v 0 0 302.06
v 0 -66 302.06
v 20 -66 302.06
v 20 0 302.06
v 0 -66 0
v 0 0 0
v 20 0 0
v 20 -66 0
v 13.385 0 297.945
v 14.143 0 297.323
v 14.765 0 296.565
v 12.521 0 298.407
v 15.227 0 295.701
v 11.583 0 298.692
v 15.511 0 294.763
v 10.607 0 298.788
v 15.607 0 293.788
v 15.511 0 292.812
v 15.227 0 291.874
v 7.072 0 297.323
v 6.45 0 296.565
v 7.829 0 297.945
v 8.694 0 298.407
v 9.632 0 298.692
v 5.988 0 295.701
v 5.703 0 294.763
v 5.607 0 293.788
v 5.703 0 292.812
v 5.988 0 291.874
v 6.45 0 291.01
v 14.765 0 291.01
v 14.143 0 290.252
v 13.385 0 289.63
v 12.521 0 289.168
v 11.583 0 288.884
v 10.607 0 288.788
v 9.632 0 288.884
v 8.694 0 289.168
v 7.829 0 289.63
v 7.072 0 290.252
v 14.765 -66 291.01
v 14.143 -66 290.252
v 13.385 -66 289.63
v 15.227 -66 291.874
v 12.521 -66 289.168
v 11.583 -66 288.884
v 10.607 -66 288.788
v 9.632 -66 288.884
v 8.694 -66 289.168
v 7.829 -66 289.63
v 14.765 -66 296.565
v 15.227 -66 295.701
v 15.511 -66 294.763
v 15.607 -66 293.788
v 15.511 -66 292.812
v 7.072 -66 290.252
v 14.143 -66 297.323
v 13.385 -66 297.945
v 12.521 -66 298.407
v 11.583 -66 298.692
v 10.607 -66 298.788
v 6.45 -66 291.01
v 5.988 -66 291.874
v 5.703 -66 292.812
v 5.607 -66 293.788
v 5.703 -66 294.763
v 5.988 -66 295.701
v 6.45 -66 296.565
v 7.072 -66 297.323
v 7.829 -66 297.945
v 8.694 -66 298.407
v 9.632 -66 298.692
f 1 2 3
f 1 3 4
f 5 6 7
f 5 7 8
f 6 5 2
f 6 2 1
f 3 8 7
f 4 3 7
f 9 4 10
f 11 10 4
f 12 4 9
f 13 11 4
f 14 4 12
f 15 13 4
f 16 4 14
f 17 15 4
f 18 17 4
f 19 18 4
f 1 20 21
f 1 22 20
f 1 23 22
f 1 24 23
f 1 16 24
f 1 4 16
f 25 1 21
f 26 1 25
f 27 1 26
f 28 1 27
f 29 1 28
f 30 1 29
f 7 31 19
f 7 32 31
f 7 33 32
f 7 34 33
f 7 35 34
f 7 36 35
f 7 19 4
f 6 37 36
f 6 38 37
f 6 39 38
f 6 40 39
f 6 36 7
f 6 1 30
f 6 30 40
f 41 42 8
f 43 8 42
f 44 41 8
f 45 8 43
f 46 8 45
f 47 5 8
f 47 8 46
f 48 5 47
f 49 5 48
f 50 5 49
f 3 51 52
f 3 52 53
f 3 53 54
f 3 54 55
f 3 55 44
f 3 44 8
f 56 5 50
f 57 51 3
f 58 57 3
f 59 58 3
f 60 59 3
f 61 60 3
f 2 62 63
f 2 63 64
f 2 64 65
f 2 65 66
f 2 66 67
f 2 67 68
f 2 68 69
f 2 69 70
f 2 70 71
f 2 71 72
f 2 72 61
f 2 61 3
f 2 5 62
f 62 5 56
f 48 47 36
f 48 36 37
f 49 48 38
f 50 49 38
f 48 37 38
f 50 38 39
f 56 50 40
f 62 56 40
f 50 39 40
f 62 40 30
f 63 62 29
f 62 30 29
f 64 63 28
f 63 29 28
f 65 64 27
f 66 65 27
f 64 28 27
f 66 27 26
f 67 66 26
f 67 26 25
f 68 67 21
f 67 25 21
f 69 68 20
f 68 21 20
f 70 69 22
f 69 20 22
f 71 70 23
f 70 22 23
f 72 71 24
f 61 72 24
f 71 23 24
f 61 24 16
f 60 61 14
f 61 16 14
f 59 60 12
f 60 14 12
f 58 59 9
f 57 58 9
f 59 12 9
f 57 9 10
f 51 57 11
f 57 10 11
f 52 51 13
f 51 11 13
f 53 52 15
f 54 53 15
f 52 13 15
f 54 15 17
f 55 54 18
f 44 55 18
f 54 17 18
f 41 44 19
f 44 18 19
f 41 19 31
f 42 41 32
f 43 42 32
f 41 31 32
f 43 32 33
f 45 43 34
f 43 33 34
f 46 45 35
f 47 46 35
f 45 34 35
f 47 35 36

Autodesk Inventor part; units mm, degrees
ref_plane "YZ Plane" through (0, 0, 0) normal (1, 0, 0) x (0, 1, 0)
ref_plane "XZ Plane" through (0, 0, 0) normal (0, 1, 0) x (-1, 0, 0)
ref_plane "XY Plane" through (0, 0, 0) normal (0, 0, 1) x (1, 0, 0)
sketch "スケッチ1" plane through (0, 0, 0) normal (1, 0, 0) x (0, 1, 0)
  line L0 (0, 0) -> (-66, 0)
  line L1 (-66, 0) -> (-66, 302.0596)
  line L2 (-66, 302.0596) -> (0, 302.0596)
  line L3 (0, 302.0596) -> (0, 0)
  dimension "d9" = 66
extrude "押し出し1" add sketch "スケッチ1" along normal blind 20
sketch "スケッチ2" plane through (0, -66, 0) normal (0, -1, 0) x (1, 0, 0)
  point P0 (0, 0)
  point P1 (10.6073, 293.7876)
hole "穴1" at (10.6073, -66, 293.7876) direction (0, 1, 0) diameter 10 end through all
properties part number "垂直アーム(仮)" material "アルミニウム 6061"
